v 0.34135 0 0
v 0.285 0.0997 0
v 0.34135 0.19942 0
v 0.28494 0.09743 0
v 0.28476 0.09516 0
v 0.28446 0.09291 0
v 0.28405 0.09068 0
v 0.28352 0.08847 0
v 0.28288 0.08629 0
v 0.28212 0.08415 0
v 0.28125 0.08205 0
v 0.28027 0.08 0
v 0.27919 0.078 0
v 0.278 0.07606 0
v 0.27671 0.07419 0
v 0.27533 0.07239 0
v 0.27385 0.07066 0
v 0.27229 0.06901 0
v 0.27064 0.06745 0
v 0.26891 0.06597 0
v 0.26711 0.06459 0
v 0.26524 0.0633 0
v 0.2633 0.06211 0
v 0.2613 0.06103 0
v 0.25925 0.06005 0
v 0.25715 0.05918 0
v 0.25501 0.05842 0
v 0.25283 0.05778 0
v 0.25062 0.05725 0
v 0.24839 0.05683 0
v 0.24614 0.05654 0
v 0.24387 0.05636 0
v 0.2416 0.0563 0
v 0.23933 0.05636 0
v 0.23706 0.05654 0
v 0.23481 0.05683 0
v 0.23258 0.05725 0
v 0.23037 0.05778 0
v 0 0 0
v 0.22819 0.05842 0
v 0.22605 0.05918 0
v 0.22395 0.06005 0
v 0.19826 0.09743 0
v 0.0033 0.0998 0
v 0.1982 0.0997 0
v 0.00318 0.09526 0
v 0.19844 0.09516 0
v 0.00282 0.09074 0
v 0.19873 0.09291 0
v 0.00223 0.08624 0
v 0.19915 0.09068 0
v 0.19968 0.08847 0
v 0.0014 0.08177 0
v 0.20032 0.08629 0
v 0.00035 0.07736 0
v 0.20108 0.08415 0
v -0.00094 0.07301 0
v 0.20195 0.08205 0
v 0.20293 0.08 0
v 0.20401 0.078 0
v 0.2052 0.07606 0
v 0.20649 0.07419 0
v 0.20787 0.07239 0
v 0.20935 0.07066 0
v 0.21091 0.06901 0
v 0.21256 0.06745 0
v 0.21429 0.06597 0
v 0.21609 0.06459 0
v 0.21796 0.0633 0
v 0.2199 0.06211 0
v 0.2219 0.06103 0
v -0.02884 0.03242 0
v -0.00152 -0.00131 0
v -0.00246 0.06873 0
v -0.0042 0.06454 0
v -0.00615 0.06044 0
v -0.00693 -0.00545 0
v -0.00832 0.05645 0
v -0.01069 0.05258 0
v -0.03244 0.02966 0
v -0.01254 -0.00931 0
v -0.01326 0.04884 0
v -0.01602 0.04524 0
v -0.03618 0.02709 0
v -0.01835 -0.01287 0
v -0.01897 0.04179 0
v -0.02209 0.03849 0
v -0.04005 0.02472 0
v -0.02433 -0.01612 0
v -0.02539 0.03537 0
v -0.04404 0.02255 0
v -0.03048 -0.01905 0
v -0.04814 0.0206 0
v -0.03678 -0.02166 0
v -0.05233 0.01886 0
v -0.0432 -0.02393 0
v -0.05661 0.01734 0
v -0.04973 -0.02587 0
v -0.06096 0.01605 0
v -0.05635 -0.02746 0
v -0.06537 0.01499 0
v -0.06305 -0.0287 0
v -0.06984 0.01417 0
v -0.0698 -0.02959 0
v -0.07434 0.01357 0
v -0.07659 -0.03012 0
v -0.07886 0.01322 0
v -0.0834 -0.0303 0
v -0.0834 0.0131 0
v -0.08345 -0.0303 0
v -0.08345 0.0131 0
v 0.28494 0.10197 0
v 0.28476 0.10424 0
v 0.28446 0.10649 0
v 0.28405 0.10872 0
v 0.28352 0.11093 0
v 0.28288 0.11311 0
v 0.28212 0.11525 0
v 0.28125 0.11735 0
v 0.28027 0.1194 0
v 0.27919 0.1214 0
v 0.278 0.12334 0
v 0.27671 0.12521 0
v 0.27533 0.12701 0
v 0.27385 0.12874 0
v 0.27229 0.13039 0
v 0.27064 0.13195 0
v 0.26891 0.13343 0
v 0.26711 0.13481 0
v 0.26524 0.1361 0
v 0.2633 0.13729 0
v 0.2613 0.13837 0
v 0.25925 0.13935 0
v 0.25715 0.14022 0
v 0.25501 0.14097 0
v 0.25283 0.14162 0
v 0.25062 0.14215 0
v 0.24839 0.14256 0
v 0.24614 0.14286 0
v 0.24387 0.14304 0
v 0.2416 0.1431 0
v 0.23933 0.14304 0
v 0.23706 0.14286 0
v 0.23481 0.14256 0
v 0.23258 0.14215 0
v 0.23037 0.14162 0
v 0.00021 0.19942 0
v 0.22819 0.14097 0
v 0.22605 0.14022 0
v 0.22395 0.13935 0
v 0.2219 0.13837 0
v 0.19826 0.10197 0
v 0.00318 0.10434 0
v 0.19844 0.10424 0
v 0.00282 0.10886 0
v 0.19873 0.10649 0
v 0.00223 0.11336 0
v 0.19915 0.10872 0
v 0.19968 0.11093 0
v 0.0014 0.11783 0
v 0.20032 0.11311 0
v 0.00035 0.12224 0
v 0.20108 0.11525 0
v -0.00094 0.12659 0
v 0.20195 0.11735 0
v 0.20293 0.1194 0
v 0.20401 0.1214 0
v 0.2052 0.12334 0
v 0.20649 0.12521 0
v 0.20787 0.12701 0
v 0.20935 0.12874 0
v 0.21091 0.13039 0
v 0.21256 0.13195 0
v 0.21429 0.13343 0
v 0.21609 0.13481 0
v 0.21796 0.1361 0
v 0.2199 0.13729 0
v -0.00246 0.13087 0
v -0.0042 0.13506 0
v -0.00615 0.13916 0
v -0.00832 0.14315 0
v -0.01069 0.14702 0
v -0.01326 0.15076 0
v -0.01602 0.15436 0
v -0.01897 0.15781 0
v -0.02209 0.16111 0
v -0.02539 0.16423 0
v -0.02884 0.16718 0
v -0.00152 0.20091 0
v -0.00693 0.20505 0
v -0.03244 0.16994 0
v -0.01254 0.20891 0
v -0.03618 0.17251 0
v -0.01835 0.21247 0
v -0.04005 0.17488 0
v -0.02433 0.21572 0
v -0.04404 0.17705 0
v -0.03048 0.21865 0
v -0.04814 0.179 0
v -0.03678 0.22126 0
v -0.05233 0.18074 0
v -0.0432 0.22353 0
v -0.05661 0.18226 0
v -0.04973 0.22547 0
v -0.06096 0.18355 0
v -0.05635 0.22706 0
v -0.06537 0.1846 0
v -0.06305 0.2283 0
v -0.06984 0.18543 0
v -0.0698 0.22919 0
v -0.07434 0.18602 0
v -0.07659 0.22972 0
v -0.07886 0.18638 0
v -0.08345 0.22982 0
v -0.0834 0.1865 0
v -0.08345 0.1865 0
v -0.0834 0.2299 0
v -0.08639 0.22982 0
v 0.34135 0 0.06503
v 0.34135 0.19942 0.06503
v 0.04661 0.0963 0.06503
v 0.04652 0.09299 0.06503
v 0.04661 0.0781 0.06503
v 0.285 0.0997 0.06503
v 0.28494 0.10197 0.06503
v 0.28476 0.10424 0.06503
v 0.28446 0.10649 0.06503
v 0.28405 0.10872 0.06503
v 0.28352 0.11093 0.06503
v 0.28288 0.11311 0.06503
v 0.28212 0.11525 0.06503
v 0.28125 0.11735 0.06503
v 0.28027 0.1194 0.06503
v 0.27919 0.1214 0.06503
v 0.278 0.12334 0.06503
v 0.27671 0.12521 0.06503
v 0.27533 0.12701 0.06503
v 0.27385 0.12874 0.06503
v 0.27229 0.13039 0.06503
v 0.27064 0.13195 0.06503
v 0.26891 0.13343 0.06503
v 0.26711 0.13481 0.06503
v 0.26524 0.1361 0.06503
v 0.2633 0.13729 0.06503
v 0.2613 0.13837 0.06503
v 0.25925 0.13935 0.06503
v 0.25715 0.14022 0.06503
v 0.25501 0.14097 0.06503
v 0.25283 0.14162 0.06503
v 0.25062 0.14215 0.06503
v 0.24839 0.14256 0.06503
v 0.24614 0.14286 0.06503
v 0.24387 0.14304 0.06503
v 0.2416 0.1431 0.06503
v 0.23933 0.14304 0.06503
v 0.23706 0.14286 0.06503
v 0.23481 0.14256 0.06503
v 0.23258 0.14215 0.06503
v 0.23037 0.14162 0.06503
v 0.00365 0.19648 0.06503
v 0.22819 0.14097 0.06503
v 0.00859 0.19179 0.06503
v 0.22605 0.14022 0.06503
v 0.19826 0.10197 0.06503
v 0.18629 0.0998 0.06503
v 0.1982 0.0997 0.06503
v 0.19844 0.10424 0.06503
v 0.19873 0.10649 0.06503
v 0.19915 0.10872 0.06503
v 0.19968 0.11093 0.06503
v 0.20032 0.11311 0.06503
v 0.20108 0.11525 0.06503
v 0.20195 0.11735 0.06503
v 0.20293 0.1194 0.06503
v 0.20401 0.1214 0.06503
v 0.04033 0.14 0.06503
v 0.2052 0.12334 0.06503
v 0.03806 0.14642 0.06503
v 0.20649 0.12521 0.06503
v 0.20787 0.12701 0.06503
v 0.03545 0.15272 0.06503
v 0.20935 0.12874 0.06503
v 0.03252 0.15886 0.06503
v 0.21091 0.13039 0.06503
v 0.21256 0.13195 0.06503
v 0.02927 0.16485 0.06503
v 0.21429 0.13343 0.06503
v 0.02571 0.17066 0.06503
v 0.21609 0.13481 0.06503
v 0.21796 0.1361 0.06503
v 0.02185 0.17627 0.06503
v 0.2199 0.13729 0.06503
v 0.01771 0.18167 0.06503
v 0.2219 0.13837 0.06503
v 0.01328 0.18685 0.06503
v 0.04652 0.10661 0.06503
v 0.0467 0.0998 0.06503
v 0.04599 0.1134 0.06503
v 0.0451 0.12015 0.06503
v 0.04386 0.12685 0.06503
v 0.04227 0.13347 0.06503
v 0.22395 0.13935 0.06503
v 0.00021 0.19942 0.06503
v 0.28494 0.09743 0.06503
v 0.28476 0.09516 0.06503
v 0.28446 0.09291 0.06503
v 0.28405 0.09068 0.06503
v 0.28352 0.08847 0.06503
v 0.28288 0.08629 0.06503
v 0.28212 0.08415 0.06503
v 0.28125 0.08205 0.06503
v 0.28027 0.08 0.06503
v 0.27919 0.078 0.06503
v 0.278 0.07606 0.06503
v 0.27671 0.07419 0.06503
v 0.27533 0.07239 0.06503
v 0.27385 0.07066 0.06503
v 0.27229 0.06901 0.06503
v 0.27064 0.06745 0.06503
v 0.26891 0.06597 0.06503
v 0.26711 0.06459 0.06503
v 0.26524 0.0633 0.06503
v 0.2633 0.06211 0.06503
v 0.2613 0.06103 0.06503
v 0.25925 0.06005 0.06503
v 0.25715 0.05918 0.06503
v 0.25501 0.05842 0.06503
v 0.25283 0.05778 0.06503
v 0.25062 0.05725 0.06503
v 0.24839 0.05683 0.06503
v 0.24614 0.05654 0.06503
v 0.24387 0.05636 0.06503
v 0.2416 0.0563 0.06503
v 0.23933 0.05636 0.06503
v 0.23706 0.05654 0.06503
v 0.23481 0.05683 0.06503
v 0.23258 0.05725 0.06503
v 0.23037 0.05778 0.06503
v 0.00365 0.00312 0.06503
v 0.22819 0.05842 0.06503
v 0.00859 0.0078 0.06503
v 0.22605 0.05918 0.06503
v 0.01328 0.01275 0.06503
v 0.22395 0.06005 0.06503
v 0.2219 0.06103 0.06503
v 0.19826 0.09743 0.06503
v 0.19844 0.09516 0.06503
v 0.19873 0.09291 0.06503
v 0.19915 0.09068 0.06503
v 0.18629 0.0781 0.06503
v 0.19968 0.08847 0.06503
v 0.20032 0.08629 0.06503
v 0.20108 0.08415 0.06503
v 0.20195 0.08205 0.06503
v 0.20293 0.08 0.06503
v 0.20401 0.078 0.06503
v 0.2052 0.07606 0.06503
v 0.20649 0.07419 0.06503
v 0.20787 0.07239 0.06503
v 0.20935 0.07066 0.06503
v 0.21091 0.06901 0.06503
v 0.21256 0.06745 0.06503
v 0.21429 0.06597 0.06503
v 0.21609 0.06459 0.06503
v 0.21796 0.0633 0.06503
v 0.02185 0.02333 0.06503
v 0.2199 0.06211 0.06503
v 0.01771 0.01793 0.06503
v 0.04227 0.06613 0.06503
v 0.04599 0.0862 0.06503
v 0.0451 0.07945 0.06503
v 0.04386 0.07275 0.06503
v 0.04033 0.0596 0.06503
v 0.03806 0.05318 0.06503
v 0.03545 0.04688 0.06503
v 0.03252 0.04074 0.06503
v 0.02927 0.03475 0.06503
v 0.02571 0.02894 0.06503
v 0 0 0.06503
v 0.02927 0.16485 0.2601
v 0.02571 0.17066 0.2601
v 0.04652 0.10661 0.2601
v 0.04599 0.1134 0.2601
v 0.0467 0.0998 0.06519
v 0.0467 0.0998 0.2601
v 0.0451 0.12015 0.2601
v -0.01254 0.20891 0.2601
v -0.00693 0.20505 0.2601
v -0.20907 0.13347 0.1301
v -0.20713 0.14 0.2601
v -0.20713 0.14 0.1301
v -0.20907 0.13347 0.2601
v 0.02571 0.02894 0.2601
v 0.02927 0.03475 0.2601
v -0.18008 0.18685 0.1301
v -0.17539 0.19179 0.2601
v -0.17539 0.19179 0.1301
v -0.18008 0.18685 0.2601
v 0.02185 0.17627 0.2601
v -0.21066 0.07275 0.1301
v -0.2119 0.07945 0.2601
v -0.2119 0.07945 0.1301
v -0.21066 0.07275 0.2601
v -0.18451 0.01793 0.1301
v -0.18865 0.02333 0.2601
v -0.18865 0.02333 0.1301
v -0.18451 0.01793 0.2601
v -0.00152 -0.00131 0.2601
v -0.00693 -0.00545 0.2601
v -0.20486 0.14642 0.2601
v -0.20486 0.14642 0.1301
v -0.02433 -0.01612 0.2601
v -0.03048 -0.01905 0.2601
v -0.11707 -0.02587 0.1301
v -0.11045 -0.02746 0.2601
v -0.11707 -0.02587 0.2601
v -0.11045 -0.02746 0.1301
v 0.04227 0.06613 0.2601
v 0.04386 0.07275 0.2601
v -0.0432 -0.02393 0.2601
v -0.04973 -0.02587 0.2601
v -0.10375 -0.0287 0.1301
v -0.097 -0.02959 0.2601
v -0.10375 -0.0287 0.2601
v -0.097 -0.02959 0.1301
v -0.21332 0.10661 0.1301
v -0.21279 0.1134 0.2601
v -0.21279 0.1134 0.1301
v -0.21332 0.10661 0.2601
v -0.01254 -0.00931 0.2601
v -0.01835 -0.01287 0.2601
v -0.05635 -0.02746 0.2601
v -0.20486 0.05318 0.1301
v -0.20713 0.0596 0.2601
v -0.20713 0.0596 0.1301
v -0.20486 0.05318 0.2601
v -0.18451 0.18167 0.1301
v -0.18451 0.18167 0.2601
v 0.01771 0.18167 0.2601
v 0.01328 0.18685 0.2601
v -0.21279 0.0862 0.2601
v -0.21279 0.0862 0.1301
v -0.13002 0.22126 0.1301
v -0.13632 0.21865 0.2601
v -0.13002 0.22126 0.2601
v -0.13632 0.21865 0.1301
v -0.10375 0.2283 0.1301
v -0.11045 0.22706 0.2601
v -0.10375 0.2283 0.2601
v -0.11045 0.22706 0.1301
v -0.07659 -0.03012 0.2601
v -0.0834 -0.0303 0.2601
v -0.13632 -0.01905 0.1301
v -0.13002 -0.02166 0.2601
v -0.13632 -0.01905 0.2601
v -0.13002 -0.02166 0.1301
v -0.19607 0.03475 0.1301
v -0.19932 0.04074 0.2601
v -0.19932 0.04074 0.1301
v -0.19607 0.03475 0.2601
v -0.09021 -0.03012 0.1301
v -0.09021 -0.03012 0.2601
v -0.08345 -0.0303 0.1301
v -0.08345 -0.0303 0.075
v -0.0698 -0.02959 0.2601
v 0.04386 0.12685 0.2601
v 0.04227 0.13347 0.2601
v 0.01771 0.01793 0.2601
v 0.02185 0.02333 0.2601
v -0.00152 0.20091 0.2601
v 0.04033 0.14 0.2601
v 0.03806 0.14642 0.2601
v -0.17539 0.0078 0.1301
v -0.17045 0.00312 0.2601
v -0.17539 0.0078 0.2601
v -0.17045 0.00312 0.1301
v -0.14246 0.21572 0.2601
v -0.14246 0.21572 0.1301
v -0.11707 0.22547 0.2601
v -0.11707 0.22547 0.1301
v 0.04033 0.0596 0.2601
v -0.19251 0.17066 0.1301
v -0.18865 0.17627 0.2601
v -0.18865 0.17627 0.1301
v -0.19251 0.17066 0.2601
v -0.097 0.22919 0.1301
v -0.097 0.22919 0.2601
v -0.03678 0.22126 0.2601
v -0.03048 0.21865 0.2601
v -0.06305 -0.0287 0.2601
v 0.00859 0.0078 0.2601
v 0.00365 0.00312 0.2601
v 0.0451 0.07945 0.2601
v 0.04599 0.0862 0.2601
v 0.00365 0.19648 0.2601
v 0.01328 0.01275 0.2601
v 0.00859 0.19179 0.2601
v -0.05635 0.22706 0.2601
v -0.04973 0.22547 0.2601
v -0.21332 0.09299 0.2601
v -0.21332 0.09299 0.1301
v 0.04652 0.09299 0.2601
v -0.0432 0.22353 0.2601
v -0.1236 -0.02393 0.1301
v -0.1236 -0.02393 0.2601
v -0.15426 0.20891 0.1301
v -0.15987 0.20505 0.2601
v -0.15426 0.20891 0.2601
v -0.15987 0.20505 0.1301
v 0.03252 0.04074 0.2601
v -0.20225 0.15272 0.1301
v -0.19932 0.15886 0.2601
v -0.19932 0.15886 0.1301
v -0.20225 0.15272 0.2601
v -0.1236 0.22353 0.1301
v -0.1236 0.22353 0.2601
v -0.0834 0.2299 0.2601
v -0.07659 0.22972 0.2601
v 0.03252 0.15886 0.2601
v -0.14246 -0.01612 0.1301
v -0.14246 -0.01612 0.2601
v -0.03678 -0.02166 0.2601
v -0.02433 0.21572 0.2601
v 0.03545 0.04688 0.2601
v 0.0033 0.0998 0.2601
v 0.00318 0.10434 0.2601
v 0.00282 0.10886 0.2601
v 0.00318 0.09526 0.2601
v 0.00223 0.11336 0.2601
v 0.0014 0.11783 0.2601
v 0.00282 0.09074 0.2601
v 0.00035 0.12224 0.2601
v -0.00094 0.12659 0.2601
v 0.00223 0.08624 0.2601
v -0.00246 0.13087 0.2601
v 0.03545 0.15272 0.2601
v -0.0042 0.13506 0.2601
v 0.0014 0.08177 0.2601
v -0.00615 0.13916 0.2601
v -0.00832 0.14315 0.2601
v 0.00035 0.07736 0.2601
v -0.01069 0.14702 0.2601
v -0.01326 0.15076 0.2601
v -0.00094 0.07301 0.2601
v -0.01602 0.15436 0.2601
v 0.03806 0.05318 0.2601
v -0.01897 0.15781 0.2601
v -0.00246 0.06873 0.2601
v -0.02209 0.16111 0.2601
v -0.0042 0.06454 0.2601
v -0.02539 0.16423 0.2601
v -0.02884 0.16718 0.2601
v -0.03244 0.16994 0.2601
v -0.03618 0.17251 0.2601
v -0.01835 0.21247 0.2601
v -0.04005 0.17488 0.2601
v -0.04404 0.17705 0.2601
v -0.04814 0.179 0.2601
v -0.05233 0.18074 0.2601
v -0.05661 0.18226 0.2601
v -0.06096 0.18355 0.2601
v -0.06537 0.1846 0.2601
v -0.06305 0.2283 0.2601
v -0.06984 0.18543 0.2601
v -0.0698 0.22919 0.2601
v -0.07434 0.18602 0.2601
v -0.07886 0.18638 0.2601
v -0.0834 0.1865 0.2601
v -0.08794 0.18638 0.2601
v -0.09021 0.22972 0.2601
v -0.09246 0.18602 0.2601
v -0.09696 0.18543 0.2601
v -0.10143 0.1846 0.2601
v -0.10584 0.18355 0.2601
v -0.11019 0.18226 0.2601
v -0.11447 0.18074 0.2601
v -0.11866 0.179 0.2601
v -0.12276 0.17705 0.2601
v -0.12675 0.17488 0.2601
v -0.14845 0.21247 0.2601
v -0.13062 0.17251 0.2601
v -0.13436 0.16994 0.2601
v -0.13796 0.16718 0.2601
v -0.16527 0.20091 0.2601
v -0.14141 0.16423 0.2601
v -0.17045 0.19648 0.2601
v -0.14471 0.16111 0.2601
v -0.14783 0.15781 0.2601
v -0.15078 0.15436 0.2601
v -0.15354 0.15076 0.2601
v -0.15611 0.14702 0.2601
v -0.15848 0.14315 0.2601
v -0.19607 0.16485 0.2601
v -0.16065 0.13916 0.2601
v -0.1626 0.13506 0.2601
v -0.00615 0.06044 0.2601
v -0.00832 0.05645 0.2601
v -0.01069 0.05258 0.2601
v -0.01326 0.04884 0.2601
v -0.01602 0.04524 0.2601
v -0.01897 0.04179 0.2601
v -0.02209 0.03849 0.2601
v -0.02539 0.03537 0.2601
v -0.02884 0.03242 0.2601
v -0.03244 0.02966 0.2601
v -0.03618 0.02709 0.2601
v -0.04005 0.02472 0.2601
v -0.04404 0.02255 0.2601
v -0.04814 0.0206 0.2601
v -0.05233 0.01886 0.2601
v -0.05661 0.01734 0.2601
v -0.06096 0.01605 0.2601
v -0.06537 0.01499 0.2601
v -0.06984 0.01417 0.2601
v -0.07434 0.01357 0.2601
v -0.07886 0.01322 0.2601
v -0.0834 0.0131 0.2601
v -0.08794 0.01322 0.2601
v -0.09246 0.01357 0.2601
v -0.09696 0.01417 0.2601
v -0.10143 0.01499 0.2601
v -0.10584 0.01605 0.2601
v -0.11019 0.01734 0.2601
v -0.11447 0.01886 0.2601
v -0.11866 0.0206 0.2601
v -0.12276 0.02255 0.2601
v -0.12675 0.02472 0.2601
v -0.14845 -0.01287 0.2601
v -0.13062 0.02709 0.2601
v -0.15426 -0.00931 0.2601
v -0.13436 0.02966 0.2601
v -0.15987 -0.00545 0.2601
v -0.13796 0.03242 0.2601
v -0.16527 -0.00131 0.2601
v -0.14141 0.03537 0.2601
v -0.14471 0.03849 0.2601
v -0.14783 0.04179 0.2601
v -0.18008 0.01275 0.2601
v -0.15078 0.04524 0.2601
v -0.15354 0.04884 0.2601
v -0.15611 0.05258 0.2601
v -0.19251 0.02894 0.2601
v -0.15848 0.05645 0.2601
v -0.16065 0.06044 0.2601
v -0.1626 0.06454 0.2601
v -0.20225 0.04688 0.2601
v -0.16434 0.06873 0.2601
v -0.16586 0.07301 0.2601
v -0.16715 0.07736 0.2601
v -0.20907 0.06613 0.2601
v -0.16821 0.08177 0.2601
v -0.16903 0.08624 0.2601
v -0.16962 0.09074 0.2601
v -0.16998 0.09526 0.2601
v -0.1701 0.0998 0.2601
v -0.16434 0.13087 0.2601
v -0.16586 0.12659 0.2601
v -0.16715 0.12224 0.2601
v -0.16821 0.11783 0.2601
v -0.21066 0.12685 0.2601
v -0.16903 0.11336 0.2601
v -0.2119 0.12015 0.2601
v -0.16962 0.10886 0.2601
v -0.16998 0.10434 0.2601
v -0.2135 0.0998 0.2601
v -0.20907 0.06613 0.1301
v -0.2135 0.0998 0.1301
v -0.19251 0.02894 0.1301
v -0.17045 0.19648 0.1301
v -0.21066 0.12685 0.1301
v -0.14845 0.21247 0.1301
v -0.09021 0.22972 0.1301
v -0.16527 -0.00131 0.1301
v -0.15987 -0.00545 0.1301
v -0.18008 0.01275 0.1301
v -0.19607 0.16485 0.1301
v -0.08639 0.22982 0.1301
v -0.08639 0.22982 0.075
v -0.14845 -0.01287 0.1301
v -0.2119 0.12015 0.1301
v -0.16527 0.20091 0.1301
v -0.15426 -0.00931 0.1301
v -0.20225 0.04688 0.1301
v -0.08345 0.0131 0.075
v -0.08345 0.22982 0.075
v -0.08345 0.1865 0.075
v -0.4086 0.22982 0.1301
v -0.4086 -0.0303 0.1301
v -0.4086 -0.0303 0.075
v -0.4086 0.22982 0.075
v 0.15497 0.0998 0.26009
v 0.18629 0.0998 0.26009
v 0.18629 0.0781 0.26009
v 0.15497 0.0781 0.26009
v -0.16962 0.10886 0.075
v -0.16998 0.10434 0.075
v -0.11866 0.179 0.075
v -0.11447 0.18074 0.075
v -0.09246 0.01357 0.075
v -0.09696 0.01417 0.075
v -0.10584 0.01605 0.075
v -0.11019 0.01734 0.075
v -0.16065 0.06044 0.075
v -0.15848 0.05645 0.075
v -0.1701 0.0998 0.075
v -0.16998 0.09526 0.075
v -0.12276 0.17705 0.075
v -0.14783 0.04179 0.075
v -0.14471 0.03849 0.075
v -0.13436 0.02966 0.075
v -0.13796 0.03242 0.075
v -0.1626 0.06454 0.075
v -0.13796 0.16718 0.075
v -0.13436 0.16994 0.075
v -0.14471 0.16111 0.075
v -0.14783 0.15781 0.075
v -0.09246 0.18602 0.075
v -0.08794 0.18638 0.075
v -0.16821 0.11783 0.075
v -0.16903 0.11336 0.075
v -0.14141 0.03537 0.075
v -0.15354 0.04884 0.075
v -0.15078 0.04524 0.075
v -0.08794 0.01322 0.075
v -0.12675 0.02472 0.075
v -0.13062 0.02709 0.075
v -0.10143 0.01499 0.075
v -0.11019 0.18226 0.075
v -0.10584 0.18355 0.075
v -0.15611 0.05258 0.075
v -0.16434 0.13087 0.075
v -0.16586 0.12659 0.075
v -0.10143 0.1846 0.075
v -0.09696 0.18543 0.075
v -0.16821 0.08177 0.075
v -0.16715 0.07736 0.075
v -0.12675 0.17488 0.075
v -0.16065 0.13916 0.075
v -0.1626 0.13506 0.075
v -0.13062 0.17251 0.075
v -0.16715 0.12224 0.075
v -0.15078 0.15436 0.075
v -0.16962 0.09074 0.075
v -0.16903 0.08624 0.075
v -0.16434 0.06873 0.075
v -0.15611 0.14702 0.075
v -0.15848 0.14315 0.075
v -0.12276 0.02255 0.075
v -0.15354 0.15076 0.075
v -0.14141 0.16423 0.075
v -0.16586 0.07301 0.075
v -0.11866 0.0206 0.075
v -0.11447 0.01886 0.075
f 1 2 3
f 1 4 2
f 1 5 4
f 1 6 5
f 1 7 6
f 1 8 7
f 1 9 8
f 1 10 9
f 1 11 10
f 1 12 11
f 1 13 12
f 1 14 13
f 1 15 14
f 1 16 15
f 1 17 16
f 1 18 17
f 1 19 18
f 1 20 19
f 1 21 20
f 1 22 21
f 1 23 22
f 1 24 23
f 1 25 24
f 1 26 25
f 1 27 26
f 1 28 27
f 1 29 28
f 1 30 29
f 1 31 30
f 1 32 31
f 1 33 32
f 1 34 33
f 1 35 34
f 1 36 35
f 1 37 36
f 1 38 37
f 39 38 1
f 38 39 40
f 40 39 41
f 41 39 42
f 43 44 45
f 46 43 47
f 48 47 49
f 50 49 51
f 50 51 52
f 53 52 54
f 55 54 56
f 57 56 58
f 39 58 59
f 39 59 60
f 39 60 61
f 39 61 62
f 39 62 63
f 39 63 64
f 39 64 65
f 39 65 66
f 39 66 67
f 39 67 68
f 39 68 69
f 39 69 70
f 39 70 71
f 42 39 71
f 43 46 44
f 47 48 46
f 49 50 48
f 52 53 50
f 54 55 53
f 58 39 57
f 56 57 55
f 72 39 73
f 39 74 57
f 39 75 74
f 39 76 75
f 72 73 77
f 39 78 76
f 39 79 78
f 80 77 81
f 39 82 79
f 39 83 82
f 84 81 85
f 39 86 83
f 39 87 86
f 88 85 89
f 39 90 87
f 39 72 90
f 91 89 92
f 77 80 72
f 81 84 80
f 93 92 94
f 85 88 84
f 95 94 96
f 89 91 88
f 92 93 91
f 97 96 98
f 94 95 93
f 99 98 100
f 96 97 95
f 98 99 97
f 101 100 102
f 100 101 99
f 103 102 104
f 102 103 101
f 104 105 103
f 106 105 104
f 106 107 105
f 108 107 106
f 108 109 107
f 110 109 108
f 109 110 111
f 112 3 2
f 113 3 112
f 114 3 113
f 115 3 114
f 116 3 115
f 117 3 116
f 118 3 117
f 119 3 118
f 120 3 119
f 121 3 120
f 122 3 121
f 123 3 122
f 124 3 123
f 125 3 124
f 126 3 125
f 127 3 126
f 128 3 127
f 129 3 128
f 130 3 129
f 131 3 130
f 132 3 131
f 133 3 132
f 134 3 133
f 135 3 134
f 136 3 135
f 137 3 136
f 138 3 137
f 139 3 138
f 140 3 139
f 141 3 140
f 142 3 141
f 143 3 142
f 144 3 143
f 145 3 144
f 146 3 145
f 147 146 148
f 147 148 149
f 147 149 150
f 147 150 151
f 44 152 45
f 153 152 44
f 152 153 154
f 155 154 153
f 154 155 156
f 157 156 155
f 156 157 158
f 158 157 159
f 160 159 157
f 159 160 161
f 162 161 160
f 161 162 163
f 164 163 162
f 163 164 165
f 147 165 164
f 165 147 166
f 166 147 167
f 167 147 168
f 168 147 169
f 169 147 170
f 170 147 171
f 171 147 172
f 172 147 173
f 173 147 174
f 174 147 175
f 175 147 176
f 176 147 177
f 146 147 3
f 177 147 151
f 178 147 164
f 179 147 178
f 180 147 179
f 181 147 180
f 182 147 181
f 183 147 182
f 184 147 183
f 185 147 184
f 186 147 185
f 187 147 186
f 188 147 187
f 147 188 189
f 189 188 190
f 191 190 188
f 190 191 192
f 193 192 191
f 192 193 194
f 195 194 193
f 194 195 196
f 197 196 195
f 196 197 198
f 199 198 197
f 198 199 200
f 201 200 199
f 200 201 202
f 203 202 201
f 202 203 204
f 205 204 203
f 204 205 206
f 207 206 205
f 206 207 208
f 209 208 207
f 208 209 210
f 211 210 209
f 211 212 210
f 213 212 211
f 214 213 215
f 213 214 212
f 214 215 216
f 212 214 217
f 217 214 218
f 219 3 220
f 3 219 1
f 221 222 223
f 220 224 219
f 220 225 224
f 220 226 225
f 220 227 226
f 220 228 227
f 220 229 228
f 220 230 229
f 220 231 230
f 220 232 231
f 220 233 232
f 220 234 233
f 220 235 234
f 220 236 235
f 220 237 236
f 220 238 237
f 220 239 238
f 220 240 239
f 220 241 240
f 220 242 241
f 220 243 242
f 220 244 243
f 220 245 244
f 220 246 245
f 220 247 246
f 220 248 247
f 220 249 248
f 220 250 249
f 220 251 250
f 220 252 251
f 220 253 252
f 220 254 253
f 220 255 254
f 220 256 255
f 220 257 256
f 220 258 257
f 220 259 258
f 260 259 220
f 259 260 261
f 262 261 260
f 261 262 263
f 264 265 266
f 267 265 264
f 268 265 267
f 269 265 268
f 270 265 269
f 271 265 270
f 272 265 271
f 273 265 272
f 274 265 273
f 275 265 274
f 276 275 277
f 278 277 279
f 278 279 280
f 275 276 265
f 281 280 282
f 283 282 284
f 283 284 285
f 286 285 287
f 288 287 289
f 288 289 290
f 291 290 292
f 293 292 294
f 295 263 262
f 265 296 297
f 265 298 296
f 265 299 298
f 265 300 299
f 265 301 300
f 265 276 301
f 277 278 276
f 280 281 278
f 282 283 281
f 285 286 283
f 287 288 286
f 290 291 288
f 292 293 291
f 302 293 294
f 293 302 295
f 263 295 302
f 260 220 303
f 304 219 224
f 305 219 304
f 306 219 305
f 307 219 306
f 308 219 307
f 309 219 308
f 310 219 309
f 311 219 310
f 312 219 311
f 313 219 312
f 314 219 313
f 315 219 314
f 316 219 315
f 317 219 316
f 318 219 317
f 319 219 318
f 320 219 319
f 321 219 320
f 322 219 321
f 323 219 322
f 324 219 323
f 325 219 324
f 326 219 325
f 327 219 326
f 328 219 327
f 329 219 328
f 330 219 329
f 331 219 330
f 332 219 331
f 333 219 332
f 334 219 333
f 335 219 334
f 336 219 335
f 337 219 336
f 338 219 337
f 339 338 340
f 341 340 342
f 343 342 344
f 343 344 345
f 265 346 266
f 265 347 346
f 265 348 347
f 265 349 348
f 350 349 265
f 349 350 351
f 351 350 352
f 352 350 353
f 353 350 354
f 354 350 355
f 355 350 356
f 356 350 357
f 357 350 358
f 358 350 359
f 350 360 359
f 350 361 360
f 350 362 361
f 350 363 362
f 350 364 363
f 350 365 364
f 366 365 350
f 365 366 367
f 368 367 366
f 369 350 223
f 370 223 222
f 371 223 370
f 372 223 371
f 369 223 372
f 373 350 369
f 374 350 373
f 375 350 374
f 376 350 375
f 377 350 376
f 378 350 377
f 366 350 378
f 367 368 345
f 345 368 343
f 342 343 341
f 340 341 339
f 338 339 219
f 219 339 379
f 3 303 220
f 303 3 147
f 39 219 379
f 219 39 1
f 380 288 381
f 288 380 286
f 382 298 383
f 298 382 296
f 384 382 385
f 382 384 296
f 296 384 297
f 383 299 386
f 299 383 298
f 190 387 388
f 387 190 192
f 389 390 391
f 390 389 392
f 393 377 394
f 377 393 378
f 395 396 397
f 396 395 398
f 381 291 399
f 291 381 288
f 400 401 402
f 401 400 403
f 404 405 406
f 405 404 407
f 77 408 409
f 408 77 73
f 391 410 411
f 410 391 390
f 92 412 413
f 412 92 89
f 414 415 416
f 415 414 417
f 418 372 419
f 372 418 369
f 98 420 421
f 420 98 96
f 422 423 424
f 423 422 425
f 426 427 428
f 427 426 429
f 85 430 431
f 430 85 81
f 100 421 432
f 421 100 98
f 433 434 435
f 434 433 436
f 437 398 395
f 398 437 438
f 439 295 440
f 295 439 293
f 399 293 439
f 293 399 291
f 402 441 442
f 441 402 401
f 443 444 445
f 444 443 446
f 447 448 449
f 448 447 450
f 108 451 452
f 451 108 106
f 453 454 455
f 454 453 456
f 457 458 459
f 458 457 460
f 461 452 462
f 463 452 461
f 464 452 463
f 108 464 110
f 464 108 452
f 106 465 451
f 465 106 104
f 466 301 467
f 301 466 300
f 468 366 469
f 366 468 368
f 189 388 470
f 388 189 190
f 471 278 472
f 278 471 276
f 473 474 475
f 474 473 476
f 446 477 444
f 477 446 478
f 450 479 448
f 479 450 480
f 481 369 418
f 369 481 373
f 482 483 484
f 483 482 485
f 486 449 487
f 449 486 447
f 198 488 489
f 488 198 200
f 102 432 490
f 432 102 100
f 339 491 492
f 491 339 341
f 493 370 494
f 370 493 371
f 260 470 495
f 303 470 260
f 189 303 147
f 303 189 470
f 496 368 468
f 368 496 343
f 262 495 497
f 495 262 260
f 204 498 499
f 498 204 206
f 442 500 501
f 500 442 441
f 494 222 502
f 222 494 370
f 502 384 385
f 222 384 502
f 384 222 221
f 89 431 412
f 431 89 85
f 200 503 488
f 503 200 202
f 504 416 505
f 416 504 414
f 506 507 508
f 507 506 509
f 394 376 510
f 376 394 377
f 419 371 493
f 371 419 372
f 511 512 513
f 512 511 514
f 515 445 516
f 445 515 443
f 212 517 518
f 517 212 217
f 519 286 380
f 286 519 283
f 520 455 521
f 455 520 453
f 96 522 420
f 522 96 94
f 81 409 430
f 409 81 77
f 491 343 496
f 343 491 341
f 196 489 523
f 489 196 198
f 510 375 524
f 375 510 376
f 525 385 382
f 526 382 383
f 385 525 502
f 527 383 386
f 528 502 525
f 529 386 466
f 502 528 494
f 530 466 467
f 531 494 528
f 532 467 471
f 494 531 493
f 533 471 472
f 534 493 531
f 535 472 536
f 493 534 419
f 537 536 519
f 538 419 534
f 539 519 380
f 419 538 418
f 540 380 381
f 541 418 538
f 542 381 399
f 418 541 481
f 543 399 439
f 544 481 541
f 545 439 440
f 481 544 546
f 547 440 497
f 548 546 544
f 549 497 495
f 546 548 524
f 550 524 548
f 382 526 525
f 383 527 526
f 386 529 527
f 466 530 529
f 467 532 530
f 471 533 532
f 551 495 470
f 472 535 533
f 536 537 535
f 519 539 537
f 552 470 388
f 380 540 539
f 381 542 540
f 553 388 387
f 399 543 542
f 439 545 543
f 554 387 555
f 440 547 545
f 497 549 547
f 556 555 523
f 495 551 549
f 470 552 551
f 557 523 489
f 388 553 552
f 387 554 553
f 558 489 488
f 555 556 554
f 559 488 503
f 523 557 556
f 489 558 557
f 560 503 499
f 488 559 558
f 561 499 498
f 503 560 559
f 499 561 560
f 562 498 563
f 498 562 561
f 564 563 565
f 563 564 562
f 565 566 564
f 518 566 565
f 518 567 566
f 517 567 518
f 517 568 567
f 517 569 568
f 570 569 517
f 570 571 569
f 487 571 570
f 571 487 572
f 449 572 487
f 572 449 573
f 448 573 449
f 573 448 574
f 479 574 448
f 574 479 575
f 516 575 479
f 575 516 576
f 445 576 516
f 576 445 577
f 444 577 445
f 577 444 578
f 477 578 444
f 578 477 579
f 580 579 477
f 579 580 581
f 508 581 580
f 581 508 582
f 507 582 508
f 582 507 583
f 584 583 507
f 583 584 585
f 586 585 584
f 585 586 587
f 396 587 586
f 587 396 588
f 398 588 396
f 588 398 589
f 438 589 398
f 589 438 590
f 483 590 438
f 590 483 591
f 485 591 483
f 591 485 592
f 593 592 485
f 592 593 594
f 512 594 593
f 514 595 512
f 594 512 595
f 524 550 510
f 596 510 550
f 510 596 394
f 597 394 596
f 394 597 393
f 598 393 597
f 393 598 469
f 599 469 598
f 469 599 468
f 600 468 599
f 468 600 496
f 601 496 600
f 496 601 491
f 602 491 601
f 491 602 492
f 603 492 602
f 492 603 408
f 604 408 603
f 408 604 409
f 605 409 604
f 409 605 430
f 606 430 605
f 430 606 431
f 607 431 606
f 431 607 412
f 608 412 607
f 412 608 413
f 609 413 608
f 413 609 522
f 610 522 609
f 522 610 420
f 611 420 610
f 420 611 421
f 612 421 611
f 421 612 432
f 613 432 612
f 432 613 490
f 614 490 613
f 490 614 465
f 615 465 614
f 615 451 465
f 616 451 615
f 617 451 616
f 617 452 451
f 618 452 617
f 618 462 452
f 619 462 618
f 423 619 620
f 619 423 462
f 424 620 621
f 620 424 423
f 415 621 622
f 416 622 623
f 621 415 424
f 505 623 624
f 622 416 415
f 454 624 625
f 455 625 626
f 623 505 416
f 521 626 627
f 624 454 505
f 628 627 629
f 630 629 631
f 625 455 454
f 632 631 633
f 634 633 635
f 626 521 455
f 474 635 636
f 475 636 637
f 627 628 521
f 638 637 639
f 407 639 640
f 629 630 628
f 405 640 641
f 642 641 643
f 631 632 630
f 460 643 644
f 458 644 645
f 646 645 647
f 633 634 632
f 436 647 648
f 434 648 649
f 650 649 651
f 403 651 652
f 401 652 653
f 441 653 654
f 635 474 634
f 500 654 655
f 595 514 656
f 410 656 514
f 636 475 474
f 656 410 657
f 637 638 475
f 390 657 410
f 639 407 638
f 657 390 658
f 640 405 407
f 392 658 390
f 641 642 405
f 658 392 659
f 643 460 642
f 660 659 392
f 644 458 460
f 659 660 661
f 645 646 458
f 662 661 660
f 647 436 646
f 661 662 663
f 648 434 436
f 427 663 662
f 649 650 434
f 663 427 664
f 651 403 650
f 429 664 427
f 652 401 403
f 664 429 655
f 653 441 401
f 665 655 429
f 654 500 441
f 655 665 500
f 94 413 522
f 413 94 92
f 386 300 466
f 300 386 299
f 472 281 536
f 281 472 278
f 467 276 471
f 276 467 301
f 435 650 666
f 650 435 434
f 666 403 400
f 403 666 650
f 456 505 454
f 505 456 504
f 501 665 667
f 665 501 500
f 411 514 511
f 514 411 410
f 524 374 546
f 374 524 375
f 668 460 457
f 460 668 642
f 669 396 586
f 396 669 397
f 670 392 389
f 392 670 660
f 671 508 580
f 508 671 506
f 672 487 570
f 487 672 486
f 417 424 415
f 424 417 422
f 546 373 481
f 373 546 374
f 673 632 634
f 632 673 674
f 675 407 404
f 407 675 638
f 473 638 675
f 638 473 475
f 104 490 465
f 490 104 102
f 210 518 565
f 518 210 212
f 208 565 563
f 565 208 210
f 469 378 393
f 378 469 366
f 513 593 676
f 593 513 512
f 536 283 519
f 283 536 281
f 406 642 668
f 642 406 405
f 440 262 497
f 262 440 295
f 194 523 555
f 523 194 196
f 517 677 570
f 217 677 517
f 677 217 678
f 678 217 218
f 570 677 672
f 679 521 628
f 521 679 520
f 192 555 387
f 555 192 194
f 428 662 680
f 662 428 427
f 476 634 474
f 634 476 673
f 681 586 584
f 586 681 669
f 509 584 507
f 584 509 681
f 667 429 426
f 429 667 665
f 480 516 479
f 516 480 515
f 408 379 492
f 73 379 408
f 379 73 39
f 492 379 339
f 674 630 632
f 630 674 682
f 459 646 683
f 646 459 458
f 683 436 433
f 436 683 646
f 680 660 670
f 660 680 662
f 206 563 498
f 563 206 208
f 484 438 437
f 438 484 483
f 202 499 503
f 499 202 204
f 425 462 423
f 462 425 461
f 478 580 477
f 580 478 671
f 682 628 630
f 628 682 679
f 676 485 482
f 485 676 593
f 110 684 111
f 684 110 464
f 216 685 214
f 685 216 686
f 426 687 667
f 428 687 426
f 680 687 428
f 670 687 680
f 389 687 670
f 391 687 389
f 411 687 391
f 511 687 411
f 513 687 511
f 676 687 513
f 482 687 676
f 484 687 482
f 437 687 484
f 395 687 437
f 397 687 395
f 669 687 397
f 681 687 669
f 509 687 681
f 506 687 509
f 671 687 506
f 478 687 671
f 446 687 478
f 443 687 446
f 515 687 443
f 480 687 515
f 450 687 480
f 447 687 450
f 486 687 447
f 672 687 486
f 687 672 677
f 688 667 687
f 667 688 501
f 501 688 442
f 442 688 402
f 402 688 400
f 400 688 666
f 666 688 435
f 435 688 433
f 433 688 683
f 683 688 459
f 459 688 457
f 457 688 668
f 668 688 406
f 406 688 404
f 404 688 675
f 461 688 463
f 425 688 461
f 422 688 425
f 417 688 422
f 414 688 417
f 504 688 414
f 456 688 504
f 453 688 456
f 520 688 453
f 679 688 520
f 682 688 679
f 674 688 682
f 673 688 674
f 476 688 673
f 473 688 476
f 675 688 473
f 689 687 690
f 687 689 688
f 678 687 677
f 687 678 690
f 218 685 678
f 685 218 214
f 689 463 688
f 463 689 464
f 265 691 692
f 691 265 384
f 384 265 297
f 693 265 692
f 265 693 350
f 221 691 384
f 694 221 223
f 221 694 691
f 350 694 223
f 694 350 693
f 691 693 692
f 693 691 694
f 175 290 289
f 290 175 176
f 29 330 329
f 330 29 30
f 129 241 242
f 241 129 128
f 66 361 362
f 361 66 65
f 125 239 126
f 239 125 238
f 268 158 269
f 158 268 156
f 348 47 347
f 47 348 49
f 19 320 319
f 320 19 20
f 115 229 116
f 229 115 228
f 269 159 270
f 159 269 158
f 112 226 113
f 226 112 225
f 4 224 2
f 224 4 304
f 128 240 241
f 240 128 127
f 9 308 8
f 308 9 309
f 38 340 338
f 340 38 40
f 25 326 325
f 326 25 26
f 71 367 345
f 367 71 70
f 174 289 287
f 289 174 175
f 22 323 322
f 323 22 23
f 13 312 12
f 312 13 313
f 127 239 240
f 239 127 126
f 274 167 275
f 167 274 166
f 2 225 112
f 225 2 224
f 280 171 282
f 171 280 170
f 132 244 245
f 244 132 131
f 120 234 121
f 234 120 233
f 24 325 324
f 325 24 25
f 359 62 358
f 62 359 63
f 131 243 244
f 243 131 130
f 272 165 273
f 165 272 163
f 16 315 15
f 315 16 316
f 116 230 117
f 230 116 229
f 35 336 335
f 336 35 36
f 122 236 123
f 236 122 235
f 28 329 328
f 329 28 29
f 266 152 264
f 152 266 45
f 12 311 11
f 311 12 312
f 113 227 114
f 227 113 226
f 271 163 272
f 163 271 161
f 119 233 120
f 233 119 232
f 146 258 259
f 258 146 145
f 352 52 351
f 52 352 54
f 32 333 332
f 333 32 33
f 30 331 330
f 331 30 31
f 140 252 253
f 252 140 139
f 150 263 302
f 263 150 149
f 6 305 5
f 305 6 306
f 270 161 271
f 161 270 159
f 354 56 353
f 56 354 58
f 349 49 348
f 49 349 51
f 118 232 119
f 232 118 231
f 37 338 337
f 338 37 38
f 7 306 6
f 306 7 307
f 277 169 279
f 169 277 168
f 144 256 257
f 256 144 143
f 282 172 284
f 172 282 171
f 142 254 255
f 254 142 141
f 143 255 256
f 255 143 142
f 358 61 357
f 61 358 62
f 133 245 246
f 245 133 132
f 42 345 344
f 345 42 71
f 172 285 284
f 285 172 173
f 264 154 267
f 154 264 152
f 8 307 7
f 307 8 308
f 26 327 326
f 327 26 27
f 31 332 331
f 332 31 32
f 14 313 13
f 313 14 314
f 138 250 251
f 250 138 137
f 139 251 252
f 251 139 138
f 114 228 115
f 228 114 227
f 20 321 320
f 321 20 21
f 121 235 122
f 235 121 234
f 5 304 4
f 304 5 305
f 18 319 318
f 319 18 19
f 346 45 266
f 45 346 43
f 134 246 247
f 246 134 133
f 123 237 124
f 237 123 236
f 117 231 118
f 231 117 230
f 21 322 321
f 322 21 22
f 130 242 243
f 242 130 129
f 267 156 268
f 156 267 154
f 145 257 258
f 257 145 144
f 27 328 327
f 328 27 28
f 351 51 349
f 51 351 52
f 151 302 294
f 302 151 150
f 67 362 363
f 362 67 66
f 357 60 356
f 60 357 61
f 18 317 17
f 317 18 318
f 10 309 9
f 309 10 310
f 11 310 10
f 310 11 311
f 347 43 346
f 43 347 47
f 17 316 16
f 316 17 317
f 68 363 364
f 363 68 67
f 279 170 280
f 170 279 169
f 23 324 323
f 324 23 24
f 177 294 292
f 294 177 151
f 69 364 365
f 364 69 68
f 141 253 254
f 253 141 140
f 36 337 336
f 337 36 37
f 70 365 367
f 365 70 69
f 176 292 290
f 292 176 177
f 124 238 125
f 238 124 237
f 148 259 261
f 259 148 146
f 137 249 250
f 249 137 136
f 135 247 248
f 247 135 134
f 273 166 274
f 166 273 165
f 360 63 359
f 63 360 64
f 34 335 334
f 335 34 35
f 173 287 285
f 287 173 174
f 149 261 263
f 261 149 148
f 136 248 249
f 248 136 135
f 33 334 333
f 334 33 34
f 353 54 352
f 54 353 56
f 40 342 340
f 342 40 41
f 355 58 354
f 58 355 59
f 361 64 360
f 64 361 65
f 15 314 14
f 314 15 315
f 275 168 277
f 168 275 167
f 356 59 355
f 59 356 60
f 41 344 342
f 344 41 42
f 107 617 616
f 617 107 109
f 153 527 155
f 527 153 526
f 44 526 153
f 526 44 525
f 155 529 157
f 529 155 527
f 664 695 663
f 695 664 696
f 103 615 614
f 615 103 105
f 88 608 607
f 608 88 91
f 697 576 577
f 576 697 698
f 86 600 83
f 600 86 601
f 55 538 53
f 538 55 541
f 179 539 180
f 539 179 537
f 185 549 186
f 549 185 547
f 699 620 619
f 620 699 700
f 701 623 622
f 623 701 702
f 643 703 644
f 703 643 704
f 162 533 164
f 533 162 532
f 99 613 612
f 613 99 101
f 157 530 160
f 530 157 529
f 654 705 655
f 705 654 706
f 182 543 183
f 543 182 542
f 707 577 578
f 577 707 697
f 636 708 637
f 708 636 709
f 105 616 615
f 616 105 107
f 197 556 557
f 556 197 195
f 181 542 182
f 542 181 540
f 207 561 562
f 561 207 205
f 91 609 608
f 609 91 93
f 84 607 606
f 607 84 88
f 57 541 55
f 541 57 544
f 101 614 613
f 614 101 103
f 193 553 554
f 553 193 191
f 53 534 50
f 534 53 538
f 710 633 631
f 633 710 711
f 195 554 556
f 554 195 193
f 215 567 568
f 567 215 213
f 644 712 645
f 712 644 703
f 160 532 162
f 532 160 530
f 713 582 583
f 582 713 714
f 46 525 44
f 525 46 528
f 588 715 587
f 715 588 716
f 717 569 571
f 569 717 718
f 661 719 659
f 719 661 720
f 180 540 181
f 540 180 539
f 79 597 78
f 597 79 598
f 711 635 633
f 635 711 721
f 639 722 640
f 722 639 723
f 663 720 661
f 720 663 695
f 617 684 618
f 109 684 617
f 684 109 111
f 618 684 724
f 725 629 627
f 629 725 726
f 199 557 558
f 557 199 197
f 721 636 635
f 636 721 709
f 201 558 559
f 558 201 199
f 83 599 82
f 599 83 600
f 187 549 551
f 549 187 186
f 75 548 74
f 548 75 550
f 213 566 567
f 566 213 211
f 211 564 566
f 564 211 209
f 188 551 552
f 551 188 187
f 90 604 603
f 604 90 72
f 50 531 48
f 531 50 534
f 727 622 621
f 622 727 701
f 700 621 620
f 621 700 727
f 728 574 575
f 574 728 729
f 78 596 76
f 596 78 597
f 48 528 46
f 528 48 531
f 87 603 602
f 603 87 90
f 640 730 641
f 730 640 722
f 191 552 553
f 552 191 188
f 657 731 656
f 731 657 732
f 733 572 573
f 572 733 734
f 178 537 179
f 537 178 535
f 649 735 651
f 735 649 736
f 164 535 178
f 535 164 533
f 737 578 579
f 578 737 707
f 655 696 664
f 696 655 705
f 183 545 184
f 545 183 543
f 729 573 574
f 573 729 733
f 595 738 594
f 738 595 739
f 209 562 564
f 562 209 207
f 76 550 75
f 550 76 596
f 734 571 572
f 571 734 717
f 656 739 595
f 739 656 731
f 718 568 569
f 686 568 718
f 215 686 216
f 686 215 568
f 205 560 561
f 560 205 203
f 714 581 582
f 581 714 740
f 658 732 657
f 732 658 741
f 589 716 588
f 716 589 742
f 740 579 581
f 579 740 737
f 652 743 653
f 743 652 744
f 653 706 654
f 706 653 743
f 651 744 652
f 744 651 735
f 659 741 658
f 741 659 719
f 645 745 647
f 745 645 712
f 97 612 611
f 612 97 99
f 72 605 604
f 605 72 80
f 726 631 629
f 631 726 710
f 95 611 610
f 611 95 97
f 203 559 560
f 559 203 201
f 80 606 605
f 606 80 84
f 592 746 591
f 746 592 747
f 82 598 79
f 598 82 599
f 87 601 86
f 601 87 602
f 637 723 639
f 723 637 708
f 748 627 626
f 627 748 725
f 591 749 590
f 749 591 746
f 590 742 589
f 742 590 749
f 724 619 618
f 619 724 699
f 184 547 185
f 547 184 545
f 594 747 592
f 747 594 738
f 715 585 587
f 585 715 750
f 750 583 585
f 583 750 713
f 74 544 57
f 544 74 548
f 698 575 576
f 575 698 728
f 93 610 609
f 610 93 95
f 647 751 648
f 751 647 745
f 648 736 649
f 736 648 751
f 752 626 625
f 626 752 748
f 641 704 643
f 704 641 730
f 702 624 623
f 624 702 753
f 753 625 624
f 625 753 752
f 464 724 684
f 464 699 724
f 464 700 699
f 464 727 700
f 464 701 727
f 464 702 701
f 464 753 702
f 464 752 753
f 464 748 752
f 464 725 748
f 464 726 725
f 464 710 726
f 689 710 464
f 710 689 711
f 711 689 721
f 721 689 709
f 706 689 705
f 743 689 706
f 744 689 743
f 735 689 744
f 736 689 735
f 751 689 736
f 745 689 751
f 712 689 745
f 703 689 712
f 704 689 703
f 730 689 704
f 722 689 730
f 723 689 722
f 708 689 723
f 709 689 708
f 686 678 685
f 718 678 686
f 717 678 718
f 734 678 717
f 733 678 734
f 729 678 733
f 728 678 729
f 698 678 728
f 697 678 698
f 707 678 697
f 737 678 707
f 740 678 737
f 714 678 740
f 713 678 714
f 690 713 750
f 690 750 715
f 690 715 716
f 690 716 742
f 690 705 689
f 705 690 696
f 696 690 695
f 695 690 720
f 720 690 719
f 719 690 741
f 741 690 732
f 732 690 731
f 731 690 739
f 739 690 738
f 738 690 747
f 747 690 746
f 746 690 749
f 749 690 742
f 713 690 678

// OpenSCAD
// ============================================================
// Parametric model: base plate with annular boss, hollow
// sleeve, stepped arm tier and triangular gusset web.
// All dimensions treated as millimeters, datum at the base
// underside (z = 0), base origin at its bottom-left corner.
// ============================================================

$fn = 120;   // smoothness for all cylindrical faces

// ---------------- Main base ----------------
base_len   = 0.341352;   // overall length (X)
base_wid   = 0.199422;   // overall width  (Y)
base_hgt   = 0.065029;   // base thickness (Z)

// -------- Low rounded annular section (upper side) --------
ann_cx     = 0.2416;     // center X from left edge
ann_cy     = 0.0997;     // center Y from front edge
ann_r_out  = 0.0997;     // outer radius
ann_r_in   = 0.0434;     // inner radius (open hole)
ann_thk    = 0.065;      // annular section thickness

// ---------------- Tall hollow sleeve ----------------
slv_cx     = -0.0834;    // center X from left reference
slv_cy     = 0.0998;     // center Y from front reference
slv_r_out  = 0.1301;     // outer radius  (0.2602 span)
slv_r_in   = 0.0867;     // inner bore radius
slv_hgt    = 0.2601;     // reach above base datum

// ---------- Projecting straight-sided arm tier ----------
arm_x0     = -0.4086;               // left edge offset
arm_x1     = base_len - 0.4248;     // right edge (right ref offset 0.4248)
arm_y0     = -0.0303;               // front edge offset
arm_y1     = base_wid + 0.0304;     // back edge (back ref offset 0.0304)
arm_hgt    = 0.1301;                // nominal full height
band_lo    = 0.0;                   // lower band cut start (underside)
band_hi    = 0.065;                 // lower band cut top -> stepped tier

// ---------------- Narrow triangular web -----------------
web_x0        = 0.0466;             // left offset
web_x1        = 0.1863;             // right offset
web_y0        = 0.0781;             // front offset
web_thk       = 0.0217;             // material thickness (Y)
web_ramp_run  = 0.108382;           // plan run of the rising profile
web_top_z     = 0.2601;             // reaches upper sleeve tier level

// ============================================================
// Modules
// ============================================================

// Base plate: simple rectangular slab
module main_base() {
    translate([0, 0, 0])
        cube([base_len, base_wid, base_hgt]);
}

// Solid (uncored) annular boss footprint
module annulus_solid(ro, ri, h) {
    difference() {
        cylinder(h = h, r = ro, center = false);
        translate([0, 0, -0.01])
            cylinder(h = h + 0.02, r = ri, center = false);
    }
}

// Hollow sleeve placed at its reference center
module sleeve_solid() {
    translate([slv_cx, slv_cy, 0])
        cylinder(h = slv_hgt, r = slv_r_out);
}

// Arm blank occupying its full footprint
module arm_blank() {
    translate([arm_x0, arm_y0, 0])
        cube([arm_x1 - arm_x0, arm_y1 - arm_y0, arm_hgt]);
}

// Triangular/trapezoidal web: profile drawn in the XZ plane,
// then extruded through the web thickness along Y.
module web_gusset() {
    ramp_x = web_x0 + web_ramp_run;         // end of rising ramp
    translate([0, web_y0 + web_thk, 0])
        rotate([90, 0, 0])
            linear_extrude(height = web_thk)
                polygon(points = [
                    [web_x0,  band_hi],          // toe at base top
                    [ramp_x,  web_top_z],        // top of the rise
                    [web_x1,  web_top_z],        // flat reach outward
                    [web_x1,  band_hi]           // heel at base top
                ]);
}

// ============================================================
// Main assembly
// ============================================================
difference() {

    // --- Union of all additive features ---
    union() {
        main_base();                        // main base slab
        translate([ann_cx, ann_cy, 0])
            annulus_solid(ann_r_out, ann_r_in, ann_thk);  // low annular ring
        sleeve_solid();                     // tall hollow sleeve blank
        arm_blank();                        // arm blank (band removed below)
        web_gusset();                       // triangular reinforcement web
    }

    // --- Subtractive features ---

    // Open the inner profile of the low annular boss straight
    // through the full 0.065 thickness (boss + base slab).
    translate([ann_cx, ann_cy, -0.01])
        cylinder(h = ann_thk + 0.02, r = ann_r_in);

    // Bore of the tall hollow sleeve, kept open full height.
    translate([slv_cx, slv_cy, -0.01])
        cylinder(h = slv_hgt + 0.02, r = slv_r_in);

    // Remove the lower band (z = 0 .. 0.065) over the entire arm
    // footprint, leaving the arm as a raised stepped tier
    // (remaining slab from 0.065 up to 0.1301).
    translate([arm_x0, arm_y0, band_lo])
        cube([arm_x1 - arm_x0,
              arm_y1 - arm_y0,
              band_hi - band_lo + 0.01]);
}
